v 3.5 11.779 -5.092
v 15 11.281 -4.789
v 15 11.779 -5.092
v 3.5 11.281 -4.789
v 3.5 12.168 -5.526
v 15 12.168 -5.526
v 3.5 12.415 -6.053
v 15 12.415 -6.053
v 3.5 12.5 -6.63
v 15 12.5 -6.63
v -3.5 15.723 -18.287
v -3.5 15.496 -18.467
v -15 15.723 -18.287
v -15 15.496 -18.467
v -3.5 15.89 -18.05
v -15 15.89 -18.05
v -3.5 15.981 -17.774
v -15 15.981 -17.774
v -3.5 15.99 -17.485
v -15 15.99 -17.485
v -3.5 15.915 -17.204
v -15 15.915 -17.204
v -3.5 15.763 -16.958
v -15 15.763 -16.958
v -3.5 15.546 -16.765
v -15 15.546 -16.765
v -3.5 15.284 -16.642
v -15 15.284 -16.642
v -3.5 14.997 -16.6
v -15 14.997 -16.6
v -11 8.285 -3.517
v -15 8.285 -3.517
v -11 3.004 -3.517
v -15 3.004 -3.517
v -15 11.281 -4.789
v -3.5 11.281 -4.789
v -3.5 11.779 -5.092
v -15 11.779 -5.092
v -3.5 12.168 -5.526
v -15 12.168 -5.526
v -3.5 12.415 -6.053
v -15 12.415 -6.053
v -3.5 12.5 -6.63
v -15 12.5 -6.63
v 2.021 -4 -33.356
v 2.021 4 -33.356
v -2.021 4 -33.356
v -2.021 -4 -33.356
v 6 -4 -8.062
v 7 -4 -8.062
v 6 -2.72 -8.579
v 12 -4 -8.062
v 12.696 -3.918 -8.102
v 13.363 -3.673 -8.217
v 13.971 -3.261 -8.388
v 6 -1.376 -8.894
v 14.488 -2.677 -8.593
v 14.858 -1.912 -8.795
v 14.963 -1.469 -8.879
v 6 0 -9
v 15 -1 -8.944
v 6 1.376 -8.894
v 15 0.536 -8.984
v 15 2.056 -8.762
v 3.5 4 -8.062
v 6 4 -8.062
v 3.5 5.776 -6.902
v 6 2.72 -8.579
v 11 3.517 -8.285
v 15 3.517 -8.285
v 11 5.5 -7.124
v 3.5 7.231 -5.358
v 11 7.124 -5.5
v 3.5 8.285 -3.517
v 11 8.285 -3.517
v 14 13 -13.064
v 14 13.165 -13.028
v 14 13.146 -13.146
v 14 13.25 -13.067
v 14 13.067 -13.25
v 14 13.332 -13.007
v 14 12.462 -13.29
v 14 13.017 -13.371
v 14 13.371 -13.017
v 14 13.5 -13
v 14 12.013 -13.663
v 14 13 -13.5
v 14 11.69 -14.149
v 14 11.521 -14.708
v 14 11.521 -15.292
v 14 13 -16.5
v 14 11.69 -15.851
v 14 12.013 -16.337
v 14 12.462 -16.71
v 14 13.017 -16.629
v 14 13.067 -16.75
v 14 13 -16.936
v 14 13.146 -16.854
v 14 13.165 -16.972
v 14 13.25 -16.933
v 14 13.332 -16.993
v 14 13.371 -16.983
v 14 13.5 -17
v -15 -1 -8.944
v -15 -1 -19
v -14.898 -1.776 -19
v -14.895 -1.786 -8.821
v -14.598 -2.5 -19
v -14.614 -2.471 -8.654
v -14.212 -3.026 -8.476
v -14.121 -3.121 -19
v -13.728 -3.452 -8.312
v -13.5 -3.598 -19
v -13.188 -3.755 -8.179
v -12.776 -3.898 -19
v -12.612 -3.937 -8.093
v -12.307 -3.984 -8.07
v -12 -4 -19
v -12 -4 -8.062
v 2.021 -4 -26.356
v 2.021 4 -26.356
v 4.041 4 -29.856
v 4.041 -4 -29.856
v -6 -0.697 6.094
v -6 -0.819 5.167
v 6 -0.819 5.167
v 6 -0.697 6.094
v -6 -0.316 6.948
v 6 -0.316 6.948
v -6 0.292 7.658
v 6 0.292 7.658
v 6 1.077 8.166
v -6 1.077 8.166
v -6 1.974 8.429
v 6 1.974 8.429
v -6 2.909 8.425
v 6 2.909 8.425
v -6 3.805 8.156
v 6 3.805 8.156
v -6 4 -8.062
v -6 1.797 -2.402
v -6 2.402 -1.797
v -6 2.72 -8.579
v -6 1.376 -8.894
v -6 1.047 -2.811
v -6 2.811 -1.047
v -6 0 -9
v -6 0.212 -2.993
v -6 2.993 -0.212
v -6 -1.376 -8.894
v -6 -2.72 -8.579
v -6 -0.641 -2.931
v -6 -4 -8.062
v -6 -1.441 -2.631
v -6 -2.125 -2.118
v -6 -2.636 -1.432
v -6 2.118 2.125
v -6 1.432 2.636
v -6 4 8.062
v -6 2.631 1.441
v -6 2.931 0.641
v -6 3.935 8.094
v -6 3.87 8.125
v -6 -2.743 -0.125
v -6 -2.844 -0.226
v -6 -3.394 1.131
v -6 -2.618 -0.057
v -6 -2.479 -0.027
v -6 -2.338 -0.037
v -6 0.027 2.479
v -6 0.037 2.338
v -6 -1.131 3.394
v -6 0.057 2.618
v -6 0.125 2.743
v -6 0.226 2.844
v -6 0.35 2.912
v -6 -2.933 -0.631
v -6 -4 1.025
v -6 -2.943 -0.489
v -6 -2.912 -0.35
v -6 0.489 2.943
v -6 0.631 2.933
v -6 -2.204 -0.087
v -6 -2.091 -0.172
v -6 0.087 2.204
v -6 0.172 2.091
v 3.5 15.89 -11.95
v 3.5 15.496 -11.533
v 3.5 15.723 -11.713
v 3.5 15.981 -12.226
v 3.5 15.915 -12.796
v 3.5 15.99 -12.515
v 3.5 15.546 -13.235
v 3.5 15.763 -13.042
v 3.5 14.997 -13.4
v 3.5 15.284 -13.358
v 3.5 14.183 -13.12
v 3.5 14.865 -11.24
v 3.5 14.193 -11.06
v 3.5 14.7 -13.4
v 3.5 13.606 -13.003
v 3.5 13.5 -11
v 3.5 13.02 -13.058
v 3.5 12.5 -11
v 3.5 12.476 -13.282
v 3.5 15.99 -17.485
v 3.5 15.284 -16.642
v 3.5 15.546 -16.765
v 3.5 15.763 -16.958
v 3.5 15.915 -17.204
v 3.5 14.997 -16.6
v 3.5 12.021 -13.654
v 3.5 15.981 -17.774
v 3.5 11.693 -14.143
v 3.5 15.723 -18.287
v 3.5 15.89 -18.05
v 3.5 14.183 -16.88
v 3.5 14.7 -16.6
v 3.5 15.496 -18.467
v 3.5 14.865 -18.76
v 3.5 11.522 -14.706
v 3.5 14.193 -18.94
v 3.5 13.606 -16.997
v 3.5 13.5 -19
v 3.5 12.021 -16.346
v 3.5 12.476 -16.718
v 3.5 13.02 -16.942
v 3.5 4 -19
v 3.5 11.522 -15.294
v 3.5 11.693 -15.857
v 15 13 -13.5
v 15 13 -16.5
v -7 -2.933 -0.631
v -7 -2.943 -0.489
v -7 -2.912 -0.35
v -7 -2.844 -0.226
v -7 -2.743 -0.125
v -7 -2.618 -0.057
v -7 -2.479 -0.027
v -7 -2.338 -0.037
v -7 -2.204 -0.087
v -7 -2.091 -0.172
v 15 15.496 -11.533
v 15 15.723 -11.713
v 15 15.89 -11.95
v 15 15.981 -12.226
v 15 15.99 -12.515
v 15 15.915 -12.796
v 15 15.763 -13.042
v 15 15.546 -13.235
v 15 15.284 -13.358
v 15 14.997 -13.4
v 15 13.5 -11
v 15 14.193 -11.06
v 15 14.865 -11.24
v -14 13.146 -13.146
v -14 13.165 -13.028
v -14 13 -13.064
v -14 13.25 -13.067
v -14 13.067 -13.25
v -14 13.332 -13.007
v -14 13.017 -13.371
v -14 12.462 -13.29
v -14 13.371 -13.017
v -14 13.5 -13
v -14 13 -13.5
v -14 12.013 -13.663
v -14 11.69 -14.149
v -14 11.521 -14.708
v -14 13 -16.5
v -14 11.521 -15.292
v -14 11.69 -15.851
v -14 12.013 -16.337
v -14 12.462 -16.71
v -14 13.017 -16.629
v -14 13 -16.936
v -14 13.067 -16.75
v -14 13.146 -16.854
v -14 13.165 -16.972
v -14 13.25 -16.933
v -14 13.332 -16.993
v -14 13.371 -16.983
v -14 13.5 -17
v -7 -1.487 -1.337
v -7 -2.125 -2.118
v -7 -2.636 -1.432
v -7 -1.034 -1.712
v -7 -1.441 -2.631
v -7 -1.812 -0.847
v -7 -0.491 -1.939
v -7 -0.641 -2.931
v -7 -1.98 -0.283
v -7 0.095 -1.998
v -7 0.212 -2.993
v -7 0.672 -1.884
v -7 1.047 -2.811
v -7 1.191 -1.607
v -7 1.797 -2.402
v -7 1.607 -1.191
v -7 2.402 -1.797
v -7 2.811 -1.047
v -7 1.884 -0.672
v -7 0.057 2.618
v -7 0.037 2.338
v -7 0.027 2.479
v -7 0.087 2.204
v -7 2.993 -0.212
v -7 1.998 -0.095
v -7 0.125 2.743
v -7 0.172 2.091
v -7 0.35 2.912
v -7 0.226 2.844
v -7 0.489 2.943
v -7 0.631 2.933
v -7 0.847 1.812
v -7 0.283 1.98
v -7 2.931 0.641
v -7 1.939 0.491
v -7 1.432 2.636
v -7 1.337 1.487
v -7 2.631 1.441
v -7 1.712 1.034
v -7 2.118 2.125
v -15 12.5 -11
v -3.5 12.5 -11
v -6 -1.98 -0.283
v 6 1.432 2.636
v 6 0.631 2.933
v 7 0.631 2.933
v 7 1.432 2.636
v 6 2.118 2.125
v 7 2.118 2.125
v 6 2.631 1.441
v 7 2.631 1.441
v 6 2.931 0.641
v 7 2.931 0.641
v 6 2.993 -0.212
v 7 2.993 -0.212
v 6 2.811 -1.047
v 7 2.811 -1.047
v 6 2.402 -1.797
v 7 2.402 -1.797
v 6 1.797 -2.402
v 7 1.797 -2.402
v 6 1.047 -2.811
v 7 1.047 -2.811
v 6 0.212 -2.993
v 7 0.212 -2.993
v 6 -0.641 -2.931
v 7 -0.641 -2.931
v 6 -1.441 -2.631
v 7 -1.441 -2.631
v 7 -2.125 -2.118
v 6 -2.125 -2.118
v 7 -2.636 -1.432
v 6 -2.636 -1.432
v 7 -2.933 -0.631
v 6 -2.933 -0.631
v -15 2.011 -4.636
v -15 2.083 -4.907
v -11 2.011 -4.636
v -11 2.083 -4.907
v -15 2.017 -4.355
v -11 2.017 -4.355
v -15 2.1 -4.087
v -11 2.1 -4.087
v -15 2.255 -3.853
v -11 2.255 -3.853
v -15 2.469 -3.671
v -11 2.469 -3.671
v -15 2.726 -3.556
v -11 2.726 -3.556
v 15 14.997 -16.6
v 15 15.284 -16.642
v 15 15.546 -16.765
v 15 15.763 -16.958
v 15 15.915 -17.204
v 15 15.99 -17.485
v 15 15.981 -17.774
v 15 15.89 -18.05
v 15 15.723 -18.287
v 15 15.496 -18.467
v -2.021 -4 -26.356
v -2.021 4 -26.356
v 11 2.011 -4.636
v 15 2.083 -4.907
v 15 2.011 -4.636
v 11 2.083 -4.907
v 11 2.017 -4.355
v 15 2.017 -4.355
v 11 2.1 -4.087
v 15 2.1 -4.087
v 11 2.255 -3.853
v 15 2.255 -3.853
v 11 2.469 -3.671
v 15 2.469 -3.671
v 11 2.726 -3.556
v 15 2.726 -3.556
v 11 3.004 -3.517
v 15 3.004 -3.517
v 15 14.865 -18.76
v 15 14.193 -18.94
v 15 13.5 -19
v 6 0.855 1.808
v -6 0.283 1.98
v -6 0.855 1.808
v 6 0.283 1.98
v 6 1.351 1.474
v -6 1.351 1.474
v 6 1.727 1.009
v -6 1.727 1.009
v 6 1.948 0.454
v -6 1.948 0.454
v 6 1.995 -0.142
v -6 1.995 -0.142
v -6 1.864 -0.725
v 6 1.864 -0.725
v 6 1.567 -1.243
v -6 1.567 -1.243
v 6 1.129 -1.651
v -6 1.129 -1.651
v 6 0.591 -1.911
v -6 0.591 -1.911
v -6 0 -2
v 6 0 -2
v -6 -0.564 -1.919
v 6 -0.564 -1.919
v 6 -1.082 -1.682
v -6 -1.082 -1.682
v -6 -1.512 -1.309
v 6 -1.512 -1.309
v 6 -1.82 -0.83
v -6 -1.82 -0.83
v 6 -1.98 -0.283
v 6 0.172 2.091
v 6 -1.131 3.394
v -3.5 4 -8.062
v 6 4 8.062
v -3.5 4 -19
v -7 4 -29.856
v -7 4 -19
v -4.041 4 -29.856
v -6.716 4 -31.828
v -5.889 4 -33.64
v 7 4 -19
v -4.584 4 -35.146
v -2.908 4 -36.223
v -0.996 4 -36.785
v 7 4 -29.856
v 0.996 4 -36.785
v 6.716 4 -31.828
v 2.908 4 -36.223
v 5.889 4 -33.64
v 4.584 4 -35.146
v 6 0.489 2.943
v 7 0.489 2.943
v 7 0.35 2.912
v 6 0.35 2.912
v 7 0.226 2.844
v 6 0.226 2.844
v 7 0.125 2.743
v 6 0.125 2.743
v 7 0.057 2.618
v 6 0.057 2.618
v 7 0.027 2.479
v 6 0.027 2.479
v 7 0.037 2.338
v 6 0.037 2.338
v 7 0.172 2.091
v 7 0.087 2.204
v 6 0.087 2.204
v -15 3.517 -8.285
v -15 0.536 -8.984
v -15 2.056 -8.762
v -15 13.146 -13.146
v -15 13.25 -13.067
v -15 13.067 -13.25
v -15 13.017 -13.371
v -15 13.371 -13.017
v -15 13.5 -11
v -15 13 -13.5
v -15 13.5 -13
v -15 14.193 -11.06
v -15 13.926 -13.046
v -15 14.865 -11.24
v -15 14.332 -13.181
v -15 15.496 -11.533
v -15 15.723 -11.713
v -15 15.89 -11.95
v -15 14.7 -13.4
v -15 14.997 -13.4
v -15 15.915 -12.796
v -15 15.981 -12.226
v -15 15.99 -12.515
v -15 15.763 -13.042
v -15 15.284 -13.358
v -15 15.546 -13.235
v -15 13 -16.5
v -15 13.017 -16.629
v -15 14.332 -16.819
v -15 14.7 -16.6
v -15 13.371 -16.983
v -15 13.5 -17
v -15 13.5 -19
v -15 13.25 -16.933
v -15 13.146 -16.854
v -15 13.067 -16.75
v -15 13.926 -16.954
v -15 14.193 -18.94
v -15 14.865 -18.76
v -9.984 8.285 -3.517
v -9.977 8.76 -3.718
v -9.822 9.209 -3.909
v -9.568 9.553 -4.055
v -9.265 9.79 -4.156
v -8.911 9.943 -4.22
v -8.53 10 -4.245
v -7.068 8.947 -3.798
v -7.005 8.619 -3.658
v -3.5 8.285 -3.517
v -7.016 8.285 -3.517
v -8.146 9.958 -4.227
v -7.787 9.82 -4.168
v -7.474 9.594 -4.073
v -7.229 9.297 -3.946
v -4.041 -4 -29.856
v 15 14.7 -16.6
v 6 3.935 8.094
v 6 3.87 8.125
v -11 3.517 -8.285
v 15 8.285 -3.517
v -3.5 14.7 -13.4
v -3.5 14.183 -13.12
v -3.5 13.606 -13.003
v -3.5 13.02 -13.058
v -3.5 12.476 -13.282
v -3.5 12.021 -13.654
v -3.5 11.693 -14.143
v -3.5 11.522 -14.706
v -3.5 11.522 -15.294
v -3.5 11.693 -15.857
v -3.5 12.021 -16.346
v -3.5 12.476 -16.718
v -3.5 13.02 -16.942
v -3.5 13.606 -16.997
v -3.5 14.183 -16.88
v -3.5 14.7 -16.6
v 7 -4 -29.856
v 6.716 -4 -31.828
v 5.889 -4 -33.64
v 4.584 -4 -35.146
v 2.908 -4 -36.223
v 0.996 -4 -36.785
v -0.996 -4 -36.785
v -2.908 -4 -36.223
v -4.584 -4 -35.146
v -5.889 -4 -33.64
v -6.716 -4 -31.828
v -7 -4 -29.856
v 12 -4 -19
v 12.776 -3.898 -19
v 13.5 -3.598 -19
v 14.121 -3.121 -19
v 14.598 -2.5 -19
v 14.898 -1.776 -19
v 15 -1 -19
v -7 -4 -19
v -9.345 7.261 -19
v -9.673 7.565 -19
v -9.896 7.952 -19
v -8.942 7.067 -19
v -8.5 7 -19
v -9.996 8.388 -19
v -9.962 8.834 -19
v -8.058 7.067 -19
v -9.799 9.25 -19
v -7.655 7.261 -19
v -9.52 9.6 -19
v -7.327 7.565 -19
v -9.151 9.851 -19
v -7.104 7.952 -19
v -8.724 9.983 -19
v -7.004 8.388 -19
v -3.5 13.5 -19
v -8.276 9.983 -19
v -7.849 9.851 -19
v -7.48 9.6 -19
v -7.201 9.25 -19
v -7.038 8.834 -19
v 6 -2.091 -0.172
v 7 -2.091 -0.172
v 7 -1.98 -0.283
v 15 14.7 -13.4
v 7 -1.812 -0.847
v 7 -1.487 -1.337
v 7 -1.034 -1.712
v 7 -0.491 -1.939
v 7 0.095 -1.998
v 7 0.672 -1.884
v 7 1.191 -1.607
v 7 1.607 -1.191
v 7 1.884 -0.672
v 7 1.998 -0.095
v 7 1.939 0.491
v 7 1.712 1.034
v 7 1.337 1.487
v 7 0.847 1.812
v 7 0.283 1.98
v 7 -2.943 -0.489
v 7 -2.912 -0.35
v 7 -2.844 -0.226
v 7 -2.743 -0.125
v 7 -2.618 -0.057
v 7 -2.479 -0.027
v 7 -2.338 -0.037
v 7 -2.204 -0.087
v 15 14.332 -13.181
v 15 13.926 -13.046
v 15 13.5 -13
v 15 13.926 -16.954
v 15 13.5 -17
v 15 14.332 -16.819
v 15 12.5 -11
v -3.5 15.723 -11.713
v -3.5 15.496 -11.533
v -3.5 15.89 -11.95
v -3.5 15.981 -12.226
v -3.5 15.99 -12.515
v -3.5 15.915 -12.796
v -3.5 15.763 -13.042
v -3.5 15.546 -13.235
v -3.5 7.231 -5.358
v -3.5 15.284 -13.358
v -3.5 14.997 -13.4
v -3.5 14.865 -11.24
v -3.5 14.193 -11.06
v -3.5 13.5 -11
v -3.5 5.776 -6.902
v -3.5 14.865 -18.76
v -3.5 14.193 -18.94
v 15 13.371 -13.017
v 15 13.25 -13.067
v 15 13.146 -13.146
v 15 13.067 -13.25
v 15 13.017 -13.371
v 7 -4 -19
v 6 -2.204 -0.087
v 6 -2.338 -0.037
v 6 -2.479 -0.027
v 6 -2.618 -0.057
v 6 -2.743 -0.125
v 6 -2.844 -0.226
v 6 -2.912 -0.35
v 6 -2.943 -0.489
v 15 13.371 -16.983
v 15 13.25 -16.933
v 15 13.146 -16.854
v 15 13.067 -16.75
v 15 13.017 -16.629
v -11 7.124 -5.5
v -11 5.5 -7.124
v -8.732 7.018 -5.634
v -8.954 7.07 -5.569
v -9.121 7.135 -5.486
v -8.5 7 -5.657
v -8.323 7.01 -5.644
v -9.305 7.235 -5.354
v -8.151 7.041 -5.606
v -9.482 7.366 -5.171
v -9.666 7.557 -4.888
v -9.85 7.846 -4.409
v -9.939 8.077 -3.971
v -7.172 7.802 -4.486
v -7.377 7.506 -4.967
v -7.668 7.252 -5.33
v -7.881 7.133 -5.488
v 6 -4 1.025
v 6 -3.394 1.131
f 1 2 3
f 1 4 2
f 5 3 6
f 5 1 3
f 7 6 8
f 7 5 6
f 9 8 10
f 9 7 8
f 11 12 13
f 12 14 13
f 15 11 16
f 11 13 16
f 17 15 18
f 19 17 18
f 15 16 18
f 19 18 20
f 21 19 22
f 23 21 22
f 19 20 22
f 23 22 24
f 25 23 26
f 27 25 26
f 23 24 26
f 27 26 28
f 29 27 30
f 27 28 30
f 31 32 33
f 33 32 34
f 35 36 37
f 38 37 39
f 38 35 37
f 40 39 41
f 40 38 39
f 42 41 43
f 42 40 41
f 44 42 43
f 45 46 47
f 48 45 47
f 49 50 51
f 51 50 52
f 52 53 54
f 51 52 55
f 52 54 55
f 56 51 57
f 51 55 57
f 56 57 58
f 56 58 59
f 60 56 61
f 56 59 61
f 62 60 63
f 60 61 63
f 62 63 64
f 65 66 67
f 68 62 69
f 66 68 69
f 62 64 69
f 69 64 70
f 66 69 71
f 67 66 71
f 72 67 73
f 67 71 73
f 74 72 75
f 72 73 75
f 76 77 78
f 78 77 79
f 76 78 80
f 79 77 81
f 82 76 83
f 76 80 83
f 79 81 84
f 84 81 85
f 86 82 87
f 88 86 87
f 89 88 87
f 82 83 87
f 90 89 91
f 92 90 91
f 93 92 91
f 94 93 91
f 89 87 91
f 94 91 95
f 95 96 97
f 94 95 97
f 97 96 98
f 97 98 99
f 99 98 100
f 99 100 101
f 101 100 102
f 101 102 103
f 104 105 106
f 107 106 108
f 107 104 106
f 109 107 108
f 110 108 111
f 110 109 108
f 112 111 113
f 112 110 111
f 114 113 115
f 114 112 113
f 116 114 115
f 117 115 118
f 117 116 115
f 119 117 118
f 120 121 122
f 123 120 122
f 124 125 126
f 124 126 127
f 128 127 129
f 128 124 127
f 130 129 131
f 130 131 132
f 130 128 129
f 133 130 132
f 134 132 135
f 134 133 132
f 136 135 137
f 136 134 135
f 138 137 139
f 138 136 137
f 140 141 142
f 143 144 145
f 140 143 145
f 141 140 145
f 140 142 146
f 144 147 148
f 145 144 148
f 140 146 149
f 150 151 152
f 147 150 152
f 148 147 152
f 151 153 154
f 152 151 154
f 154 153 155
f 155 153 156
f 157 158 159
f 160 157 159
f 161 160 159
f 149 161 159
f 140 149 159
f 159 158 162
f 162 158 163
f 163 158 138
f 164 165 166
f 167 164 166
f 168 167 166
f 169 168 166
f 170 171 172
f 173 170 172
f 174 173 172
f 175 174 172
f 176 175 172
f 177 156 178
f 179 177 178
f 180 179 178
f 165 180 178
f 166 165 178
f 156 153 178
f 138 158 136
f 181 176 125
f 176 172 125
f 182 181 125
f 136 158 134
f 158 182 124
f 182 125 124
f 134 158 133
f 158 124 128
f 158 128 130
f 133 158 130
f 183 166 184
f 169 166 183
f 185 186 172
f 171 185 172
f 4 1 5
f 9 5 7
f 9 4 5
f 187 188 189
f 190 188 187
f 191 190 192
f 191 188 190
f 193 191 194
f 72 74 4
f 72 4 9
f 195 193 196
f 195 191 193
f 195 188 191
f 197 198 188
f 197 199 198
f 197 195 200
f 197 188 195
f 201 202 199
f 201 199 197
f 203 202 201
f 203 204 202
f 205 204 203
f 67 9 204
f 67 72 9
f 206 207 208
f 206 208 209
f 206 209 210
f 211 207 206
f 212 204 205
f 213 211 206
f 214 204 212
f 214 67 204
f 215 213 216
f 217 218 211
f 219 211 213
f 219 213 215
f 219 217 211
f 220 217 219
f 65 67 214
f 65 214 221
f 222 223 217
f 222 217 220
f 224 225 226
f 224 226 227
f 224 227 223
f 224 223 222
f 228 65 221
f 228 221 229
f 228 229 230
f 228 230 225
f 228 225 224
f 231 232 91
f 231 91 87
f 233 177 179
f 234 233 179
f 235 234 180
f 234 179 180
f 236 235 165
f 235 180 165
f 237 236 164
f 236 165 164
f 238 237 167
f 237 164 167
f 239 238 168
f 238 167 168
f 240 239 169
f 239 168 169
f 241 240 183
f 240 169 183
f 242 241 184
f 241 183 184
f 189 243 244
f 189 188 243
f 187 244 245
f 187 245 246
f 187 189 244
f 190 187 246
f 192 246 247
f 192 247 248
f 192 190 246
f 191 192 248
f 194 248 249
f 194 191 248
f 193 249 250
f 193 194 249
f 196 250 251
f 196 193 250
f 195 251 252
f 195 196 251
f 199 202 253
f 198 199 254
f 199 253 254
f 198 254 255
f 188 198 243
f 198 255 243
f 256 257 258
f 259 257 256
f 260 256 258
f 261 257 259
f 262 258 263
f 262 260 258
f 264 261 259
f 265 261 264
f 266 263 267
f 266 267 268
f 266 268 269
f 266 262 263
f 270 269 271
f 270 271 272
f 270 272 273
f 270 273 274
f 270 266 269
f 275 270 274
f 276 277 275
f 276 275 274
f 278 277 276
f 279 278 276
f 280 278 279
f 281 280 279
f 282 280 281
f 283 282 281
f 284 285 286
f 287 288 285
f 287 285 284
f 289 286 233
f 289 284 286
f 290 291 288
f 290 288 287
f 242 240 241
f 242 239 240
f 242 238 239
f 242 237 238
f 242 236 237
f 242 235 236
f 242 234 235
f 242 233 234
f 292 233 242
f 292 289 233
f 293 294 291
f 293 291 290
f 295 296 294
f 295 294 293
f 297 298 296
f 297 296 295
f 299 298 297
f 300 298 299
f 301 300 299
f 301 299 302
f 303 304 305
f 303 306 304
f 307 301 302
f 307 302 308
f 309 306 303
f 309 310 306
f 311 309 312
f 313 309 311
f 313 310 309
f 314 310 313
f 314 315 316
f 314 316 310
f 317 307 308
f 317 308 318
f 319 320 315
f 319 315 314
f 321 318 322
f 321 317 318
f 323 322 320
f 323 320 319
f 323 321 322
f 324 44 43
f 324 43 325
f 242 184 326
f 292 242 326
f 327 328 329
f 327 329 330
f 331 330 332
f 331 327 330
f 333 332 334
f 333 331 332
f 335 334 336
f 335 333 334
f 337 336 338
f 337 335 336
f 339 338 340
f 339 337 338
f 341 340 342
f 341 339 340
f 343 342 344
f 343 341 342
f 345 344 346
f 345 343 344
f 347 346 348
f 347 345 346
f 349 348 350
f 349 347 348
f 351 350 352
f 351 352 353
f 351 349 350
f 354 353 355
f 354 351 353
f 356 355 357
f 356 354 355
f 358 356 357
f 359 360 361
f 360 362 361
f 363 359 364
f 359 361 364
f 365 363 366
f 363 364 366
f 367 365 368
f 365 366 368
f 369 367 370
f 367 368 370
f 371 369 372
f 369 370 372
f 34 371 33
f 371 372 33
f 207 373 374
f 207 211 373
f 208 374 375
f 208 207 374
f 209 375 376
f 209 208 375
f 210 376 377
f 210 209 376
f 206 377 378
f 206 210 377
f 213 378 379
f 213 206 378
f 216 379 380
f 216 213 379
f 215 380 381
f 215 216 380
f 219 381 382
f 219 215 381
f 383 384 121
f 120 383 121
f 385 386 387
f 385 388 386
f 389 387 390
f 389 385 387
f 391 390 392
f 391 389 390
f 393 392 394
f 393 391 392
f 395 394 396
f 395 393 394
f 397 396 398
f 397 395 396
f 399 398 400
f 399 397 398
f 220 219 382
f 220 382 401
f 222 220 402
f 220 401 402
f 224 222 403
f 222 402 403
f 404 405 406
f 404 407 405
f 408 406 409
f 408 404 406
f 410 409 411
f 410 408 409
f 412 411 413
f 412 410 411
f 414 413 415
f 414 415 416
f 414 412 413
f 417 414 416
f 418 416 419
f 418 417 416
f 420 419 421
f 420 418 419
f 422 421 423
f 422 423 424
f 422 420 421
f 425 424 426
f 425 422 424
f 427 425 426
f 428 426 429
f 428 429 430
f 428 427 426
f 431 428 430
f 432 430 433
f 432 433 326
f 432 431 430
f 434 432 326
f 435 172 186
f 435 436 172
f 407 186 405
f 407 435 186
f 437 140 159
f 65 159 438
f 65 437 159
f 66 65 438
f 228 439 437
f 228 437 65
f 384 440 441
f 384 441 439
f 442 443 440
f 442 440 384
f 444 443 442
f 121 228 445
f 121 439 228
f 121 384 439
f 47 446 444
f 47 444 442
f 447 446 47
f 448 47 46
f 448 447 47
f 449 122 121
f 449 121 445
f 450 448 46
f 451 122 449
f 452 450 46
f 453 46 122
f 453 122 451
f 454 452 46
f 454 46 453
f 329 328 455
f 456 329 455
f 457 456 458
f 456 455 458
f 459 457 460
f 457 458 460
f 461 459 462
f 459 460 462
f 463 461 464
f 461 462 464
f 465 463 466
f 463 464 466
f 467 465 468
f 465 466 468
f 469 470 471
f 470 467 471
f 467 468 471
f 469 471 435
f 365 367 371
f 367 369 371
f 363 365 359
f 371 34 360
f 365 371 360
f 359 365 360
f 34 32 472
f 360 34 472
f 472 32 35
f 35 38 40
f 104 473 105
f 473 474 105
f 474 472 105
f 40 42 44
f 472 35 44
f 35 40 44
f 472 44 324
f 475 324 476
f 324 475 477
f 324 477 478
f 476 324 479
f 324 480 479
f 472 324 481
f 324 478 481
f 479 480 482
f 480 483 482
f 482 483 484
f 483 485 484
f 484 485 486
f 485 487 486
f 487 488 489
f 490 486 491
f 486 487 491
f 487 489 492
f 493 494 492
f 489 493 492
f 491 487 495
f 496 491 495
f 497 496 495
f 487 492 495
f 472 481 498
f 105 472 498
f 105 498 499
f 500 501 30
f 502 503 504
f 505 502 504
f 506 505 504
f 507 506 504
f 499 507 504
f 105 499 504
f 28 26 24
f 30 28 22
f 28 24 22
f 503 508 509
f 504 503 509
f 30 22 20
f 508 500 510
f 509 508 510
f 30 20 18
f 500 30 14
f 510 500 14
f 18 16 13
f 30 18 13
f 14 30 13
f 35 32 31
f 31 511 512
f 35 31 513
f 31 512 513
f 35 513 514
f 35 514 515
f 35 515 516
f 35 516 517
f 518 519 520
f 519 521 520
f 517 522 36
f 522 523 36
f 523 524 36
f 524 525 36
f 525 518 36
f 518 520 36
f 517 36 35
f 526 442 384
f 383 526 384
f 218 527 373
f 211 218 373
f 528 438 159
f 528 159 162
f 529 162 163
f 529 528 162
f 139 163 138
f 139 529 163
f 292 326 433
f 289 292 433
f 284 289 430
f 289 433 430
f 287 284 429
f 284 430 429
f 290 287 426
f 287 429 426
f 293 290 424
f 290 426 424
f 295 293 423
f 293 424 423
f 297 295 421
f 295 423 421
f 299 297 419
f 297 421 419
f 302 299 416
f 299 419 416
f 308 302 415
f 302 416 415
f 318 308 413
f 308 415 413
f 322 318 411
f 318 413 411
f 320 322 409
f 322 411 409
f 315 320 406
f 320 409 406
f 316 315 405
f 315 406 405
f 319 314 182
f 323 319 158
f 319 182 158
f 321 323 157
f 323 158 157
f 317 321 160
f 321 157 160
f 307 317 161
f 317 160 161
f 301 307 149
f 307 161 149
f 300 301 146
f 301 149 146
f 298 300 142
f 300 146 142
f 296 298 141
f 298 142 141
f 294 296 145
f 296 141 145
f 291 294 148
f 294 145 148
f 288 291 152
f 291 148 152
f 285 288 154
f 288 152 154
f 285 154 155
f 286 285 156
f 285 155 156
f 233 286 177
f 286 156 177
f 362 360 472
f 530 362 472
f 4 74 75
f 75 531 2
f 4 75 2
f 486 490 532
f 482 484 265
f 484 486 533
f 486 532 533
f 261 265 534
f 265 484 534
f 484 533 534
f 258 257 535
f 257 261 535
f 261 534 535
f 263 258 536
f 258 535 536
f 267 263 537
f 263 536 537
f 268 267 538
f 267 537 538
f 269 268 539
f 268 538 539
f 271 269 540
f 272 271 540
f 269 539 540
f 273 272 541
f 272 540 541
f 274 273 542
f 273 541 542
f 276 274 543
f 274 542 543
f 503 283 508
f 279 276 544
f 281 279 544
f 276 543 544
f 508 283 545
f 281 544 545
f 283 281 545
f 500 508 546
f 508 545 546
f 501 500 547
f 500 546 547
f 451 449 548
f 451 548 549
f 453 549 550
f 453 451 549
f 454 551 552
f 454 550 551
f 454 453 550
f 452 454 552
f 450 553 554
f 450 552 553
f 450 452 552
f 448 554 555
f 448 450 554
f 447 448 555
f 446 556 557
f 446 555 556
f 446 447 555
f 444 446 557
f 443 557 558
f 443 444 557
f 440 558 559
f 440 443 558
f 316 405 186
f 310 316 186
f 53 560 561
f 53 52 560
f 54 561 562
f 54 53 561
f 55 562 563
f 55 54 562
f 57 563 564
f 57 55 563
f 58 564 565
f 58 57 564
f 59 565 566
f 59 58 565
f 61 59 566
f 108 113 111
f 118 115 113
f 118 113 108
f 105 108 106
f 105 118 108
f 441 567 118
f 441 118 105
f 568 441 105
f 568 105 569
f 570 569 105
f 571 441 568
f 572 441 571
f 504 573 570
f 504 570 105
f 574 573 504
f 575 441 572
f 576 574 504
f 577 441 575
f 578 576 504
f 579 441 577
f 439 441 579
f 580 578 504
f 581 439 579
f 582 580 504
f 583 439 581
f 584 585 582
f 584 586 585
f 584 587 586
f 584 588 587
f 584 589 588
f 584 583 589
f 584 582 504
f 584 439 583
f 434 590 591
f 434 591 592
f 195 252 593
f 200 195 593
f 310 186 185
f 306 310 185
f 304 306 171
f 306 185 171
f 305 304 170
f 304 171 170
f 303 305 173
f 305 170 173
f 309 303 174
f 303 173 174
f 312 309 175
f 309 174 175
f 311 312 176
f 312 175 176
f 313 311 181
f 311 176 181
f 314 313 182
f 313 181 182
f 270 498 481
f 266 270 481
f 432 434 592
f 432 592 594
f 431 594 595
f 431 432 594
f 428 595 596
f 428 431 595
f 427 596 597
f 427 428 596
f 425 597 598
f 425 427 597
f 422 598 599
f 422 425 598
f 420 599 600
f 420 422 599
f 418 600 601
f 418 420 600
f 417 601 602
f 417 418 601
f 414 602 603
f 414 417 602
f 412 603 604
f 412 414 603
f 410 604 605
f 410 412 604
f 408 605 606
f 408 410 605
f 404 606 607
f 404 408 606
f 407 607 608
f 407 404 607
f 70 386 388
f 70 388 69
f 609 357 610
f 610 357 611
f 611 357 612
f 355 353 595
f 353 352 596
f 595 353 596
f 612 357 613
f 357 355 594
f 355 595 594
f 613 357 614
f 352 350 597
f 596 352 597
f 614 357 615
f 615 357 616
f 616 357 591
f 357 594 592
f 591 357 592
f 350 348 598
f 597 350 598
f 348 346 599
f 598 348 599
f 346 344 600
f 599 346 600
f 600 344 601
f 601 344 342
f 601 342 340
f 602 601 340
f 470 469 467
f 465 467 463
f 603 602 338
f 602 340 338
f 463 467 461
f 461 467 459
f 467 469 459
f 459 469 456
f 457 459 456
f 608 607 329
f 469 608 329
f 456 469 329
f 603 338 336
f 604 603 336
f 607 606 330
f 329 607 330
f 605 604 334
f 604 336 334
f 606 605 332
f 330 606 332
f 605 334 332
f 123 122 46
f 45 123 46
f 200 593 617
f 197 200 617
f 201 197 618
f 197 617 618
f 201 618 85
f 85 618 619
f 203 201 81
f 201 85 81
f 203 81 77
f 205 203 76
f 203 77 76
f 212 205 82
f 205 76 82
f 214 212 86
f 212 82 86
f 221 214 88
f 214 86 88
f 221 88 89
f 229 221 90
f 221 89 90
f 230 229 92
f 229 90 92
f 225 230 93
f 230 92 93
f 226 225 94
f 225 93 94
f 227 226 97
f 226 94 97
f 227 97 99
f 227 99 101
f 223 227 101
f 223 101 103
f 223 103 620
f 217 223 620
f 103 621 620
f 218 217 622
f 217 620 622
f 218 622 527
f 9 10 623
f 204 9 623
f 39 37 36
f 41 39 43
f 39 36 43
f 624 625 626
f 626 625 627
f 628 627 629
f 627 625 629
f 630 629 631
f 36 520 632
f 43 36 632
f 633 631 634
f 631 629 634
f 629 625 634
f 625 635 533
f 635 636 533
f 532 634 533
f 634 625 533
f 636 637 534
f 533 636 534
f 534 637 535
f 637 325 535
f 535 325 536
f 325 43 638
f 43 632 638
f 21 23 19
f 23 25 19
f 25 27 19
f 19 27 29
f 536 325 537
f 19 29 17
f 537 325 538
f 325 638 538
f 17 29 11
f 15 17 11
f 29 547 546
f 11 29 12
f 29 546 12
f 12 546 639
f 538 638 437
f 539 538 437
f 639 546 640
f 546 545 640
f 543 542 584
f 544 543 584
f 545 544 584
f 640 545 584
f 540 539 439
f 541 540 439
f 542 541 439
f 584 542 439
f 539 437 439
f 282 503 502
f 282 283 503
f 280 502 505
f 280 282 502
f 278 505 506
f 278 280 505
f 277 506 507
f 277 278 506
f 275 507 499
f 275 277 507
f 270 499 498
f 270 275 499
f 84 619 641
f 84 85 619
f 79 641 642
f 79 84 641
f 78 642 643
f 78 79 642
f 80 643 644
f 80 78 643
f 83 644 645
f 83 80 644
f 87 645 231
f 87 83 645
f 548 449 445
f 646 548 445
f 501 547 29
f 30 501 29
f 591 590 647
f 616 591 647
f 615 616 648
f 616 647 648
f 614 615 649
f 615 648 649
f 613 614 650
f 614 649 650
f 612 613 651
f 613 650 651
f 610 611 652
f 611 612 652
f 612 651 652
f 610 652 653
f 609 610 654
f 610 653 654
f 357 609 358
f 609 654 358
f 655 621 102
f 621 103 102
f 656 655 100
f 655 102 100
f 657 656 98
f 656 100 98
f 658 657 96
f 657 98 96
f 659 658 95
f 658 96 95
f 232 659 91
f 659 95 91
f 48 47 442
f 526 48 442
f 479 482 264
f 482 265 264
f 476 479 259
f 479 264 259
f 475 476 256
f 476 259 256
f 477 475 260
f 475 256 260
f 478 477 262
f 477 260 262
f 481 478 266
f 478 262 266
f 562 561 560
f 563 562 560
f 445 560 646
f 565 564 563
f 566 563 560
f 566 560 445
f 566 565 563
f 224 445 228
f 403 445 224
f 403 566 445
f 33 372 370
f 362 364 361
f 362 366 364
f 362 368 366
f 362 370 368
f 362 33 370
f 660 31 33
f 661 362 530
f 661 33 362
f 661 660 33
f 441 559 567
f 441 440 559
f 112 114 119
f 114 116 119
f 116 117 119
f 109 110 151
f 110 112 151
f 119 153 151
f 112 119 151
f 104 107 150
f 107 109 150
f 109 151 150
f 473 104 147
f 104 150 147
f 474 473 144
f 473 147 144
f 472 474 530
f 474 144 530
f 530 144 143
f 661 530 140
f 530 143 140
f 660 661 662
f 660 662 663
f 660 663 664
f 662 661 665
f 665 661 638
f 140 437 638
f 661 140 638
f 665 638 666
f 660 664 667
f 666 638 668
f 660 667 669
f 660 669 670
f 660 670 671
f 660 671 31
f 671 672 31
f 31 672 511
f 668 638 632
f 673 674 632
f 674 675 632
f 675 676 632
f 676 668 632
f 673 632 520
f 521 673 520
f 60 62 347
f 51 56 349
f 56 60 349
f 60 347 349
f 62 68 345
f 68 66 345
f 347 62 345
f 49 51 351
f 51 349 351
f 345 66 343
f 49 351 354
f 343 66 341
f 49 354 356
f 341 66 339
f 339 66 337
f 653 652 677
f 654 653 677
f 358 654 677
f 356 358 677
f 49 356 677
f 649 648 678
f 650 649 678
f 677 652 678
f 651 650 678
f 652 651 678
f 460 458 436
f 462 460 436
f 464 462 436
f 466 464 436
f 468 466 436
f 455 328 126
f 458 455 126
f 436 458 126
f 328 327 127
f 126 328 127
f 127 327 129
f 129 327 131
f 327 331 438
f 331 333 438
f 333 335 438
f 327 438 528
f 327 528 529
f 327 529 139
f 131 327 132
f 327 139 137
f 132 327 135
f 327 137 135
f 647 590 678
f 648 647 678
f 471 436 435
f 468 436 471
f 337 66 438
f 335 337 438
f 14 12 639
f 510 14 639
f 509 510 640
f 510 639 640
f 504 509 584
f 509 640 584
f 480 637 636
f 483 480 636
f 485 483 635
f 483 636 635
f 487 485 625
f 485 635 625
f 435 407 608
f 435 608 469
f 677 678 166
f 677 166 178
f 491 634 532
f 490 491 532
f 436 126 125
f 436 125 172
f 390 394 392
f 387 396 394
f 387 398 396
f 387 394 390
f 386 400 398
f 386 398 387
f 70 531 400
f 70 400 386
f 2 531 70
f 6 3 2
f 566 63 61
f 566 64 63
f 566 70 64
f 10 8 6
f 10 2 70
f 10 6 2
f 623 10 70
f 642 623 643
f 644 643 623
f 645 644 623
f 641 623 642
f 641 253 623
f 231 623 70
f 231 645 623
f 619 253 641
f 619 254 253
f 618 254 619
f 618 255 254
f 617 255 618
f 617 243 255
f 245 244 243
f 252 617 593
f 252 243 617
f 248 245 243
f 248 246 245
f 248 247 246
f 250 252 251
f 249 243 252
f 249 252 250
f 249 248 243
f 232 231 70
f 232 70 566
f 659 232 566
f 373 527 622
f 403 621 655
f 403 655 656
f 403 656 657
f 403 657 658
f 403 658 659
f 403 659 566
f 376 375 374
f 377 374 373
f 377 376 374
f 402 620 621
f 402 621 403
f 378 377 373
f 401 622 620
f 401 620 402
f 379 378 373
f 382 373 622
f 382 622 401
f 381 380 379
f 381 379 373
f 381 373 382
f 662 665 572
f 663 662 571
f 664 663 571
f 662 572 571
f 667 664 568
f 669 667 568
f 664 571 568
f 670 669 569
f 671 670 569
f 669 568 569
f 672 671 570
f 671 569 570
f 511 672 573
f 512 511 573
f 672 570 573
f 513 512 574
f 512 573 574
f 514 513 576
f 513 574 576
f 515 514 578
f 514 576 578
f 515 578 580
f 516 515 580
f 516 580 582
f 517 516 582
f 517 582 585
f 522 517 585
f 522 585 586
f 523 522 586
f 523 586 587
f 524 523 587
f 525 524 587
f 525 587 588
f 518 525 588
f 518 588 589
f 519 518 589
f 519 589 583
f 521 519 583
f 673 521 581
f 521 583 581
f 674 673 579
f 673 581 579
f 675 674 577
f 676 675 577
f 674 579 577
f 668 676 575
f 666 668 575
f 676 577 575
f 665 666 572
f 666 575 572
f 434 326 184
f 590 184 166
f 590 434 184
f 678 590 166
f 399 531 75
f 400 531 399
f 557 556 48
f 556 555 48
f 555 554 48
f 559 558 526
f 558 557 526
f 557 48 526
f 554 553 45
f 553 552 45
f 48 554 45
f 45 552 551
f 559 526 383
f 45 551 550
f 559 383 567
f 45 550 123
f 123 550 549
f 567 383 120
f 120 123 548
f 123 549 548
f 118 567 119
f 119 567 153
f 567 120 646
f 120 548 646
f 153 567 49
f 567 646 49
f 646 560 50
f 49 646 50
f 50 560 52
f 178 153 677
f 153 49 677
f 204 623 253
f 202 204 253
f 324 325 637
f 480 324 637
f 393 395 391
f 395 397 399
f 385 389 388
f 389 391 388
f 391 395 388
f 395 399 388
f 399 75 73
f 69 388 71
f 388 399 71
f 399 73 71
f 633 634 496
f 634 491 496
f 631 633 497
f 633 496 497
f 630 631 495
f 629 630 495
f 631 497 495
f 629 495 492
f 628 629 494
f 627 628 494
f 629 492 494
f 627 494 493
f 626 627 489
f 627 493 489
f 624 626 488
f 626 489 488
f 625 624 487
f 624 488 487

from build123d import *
from build123d.topology import SkipClean

# Parameters (mm, degrees)
BOSS_EXTRUDE1_DEPTH      = 6
BOSS_EXTRUDE2_DEPTH      = 7
SKETCH6_R                = 7
BOSS_EXTRUDE3_DEPTH      = 18
BOSS_EXTRUDE4_DEPTH      = 8
BOSS_EXTRUDE4_DEPTH_BACK = 8
SKETCH7_R                = 4.5
CUT_EXTRUDE2_DEPTH       = 5
CUT_EXTRUDE4_START       = -5
CUT_EXTRUDE4_DEPTH       = 5
BOSS_EXTRUDE6_DEPTH      = 1
FILLET3_R                = 0.5
FILLET3_OF_MIRROR1_R     = 0.5
BOSS_EXTRUDE5_DEPTH      = 15
SKETCH20_W               = 7
SKETCH20_H               = 38
CUT_EXTRUDE7_DEPTH       = 42.913087917
FILLET1_START            = -6
FILLET1_DEPTH            = 12
FILLET2_R                = 1
CUT_EXTRUDE8_DEPTH       = 42.560578801
BOSS_EXTRUDE7_DEPTH      = 1
FILLET4_R                = 0.5
FILLET4_OF_MIRROR2_R     = 0.5
FILLET5_R                = 3
FILLET7_R                = 2
CUT_SWEEP1_PROFILE_R     = 1.5
BOSS_EXTRUDE8_DEPTH      = 4
FILLET8_R                = 1
FILLET8_OF_MIRROR3_R     = 1


with BuildPart() as part:
    # Sketch3 → Boss-Extrude1 (new, symmetric)
    with BuildSketch(Plane(origin=(0, 0, 0), x_dir=(0, 0, -1), z_dir=(1, 0, 0))):
        with BuildLine():
            ThreePointArc((2, 0), (1.51090791, -1.310403483), (0.282842712, -1.979898987))
            Line((0.282842712, -1.979898987), (-1.13137085, -3.39411255))
            Line((-1.13137085, -3.39411255), (-0.81880413, -5.166766505))
            Line((-0.81880413, -5.166766505), (-3.807139593, -8.155101968))
            ThreePointArc((-3.807139593, -8.155101968), (4.834032667, -7.591582718), (9, 0))
            ThreePointArc((9, 0), (-1.949882341, 8.7862369), (-8.155101968, -3.807139593))
            Line((-8.155101968, -3.807139593), (-5.166766505, -0.81880413))
            Line((-5.166766505, -0.81880413), (-3.39411255, -1.13137085))
            Line((-3.39411255, -1.13137085), (-1.979898987, 0.282842712))
            ThreePointArc((-1.979898987, 0.282842712), (0.14177804, 1.994968418), (2, 0))
        make_face()
    extrude(amount=BOSS_EXTRUDE1_DEPTH, both=True)

    # Sketch5 → Boss-Extrude2 (add, symmetric)
    with BuildSketch(Plane(origin=(0, 0, 0), x_dir=(0, 0, -1), z_dir=(1, 0, 0))):
        with BuildLine():
            Line((0, 9), (29.855960009, 9))
            Line((29.855960009, 9), (29.855960009, -9))
            Line((29.855960009, -9), (0, -9))
            ThreePointArc((0, -9), (9, 0), (0, 9))
        make_face()
    extrude(amount=BOSS_EXTRUDE2_DEPTH, both=True)

    # Sketch6 → Boss-Extrude3 (add)
    with BuildSketch(Plane(origin=(0, 9, 0), x_dir=(1, 0, 0), z_dir=(0, 1, 0))):
        with Locations((0, 29.855960009)):
            Circle(SKETCH6_R)
    extrude(amount=-BOSS_EXTRUDE3_DEPTH)

    # Sketch7 → Boss-Extrude4 (add, two sides: drawn at the far end of the back side and taken through both)
    with BuildSketch(Plane(origin=(0, 0, 0), x_dir=(1, 0, 0), z_dir=(0, 1, 0)).offset(-BOSS_EXTRUDE4_DEPTH_BACK)):
        with Locations((0, 29.855960009)):
            Circle(SKETCH7_R)
    extrude(amount=BOSS_EXTRUDE4_DEPTH + BOSS_EXTRUDE4_DEPTH_BACK)

    # Sketch8 → Cut-Extrude2 (cut)
    with BuildSketch(Plane(origin=(0, 9, 0), x_dir=(1, 0, 0), z_dir=(0, 1, 0))):
        with BuildLine():
            Line((6, -9), (6, 0))
            Line((6, 0), (7, 0))
            Line((7, 0), (7, 29.855960009))
            ThreePointArc((7, 29.855960009), (0, 36.855960009), (-7, 29.855960009))
            Line((-7, 29.855960009), (-7, 0))
            Line((-7, 0), (-6, 0))
            Line((-6, 0), (-6, -9))
            Line((-6, -9), (6, -9))
        make_face()
    extrude(amount=-CUT_EXTRUDE2_DEPTH, mode=Mode.SUBTRACT)

    # Sketch9 → Cut-Extrude4 (cut)
    with BuildSketch(Plane.XZ.offset(9).offset(CUT_EXTRUDE4_START)):
        with BuildLine():
            Line((6, 0), (6, 9))
            Line((6, 9), (-6, 9))
            Line((-6, 9), (-6, 0))
            Line((-6, 0), (-7, 0))
            Line((-7, 0), (-7, -29.855960009))
            ThreePointArc((-7, -29.855960009), (0, -36.855960009), (7, -29.855960009))
            Line((7, -29.855960009), (7, 0))
            Line((7, 0), (6, 0))
        make_face()
    extrude(amount=CUT_EXTRUDE4_DEPTH, mode=Mode.SUBTRACT)

    # Sketch24 → Boss-Extrude6 (add)
    with SkipClean():  # the faces are left unmerged after this step: merging them gives an invalid solid
        with BuildSketch(Plane.ZY.offset(6)):
            with BuildLine():
                ThreePointArc((-0.282842712, -1.979898987), (-1.414213562, 1.414213562), (1.979898987, 0.282842712))
                Line((1.979898987, 0.282842712), (2.925806694, -0.663064995))
                ThreePointArc((2.925806694, -0.663064995), (2.981393976, -0.333601496), (3, 0))
                ThreePointArc((3, 0), (-2.344055778, 1.872272018), (0.663064995, -2.925806694))
                Line((0.663064995, -2.925806694), (-0.282842712, -1.979898987))
            make_face()
        boss_extrude6 = extrude(amount=BOSS_EXTRUDE6_DEPTH)

    # Fillet3
    # the kernel refuses this fillet: 0.5 mm, written as the material it takes off along each edge
    with BuildSketch(Plane(origin=(-6, -0.663064995, 2.925806694), x_dir=(0, 0.9999849386062066, 0.005488402385122609), z_dir=(-1, 0, 0))) as fillet3_piece_1:
        with BuildLine():
            CenterArc((1.186161173, 0.488233633), FILLET3_R, 135.314463872, 147.140119621)
            Line((0.830672664, 0.839841255), (0, 0))
            ThreePointArc((0, 0), (0.646997003, -0.070598205), (1.293994007, 0))
        make_face()
    extrude(amount=4.234985017, mode=Mode.SUBTRACT)
    with BuildSketch(Plane(origin=(-6, -2.925806694, 0.663064995), x_dir=(0, -0.005488402385198552, -0.9999849386062063), z_dir=(-1, 0, 0))) as fillet3_piece_2:
        with BuildLine():
            CenterArc((1.186161173, -0.488233633), FILLET3_R, 77.545416507, 147.140119621)
            Line((0.830672664, -0.839841255), (0, 0))
            ThreePointArc((0, 0), (0.646997003, 0.070598205), (1.293994007, 0))
        make_face()
    extrude(amount=4.234985017, mode=Mode.SUBTRACT)

    # Mirror1: Boss-Extrude6 across plane
    add(boss_extrude6.mirror(Plane(origin=(0, 0, 0), x_dir=(0, 0, 1), z_dir=(1, 0, 0))))

    # Fillet3 of Mirror1
    # the kernel refuses this fillet: 0.5 mm, written as the material it takes off along each edge
    with BuildSketch(Plane(origin=(6, -0.663064995, 2.925806694), x_dir=(0, 0.7071067811865444, -0.7071067811865507), z_dir=(1, 0, 0))) as fillet3_of_mirror1_piece_1:
        with BuildLine():
            CenterArc((1.181249511, 0.5), FILLET3_OF_MIRROR1_R, 122.859880379, 147.140119621)
            ThreePointArc((0.909956312, 0.92), (0.404784455, 0.509645734), (0, 0))
            Line((0, 0), (1.181249511, 0))
        make_face()
    extrude(amount=4.234985017, mode=Mode.SUBTRACT)
    with BuildSketch(Plane(origin=(6, -2.925806694, 0.663064995), x_dir=(0, 0.7071067811865442, -0.7071067811865509), z_dir=(1, 0, 0))) as fillet3_of_mirror1_piece_2:
        with BuildLine():
            CenterArc((1.181249511, -0.5), FILLET3_OF_MIRROR1_R, 90, 147.140119621)
            ThreePointArc((0.909956312, -0.92), (0.404784455, -0.509645734), (0, 0))
            Line((0, 0), (1.181249511, 0))
        make_face()
    extrude(amount=4.234985017, mode=Mode.SUBTRACT)

    # Sketch10 → Boss-Extrude5 (add, symmetric)
    with BuildSketch(Plane(origin=(0, 0, 0), x_dir=(0, 0, -1), z_dir=(1, 0, 0))):
        with BuildLine():
            ThreePointArc((8.062257748, -4), (9, 0), (8.062257748, 4))
            Line((8.062257748, 4), (19, 4))
            Line((19, 4), (19, -4))
            Line((19, -4), (8.062257748, -4))
        make_face()
        with BuildLine():
            Line((13.4, 17.166060556), (13.4, 14.7))
            ThreePointArc((13.4, 14.7), (15, 11.5), (16.6, 14.7))
            Line((16.6, 14.7), (16.6, 17.166060556))
            ThreePointArc((16.6, 17.166060556), (18.346640106, 15.69089023), (19, 13.5))
            Line((19, 13.5), (19, 4))
            Line((19, 4), (8.062257748, 4))
            ThreePointArc((8.062257748, 4), (6.173062485, 6.549297638), (3.516580156, 8.284543681))
            Line((3.516580156, 8.284543681), (5.305935203, 12.5))
            Line((5.305935203, 12.5), (11, 12.5))
            Line((11, 12.5), (11, 13.5))
            ThreePointArc((11, 13.5), (11.653359894, 15.69089023), (13.4, 17.166060556))
        make_face()
    extrude(amount=BOSS_EXTRUDE5_DEPTH, both=True)

    # Sketch20 → Cut-Extrude7 (cut, through all)
    with BuildSketch(Plane(origin=(0, 4, 0), x_dir=(1, 0, 0), z_dir=(0, 1, 0))):
        Rectangle(SKETCH20_W, SKETCH20_H)
    extrude(amount=CUT_EXTRUDE7_DEPTH, mode=Mode.SUBTRACT)

    # Fillet1: read off the stored shape, not the designer's step
    # Fillet1 outline → Fillet1 (cut)
    with BuildSketch(Plane.YZ.offset(FILLET1_START)):
        with BuildLine():
            ThreePointArc((-0.81880413, 5.166766505), (0.666331593, 7.940128227), (3.804881491, 8.156155764))
            ThreePointArc((3.804881491, 8.156155764), (-0.001245944, 8.999999913), (-3.807139593, 8.155101968))
            Line((-3.807139593, 8.155101968), (-0.81880413, 5.166766505))
        make_face()
    extrude(amount=FILLET1_DEPTH, mode=Mode.SUBTRACT)

    # Fillet2
    fillet2_edges = [part.edges().sort_by_distance(p)[0] for p in [
        (9.25, 17.166060556, -16.6),
        (9.25, 17.166060556, -13.4),
        (-9.25, 17.166060556, -13.4),
        (-9.25, 17.166060556, -16.6),
    ]]
    fillet(fillet2_edges, radius=FILLET2_R)

    # Sketch23 → Cut-Extrude8 (cut, through all)
    with BuildSketch(Plane(origin=(0, 4, 0), x_dir=(1, 0, 0), z_dir=(0, 1, 0))):
        Polygon((4.041451884, 29.855960009), (2.020725942, 33.355960009), (-2.020725942, 33.355960009), (-4.041451884, 29.855960009), (-2.020725942, 26.355960009), (2.020725942, 26.355960009), align=None)
    extrude(amount=-CUT_EXTRUDE8_DEPTH, mode=Mode.SUBTRACT)

    # Sketch25 → Boss-Extrude7 (add)
    with BuildSketch(Plane(origin=(15, 0, 0), x_dir=(0, 0, -1), z_dir=(1, 0, 0))):
        with BuildLine():
            Line((16.936491673, 13), (13.063508327, 13))
            ThreePointArc((13.063508327, 13), (15, 11.5), (16.936491673, 13))
        make_face()
    boss_extrude7 = extrude(amount=-BOSS_EXTRUDE7_DEPTH)

    # Fillet4
    fillet4_edges = [part.edges().sort_by_distance(p)[0] for p in [
        (14.5, 13, -13.063508327),
        (14.5, 13, -16.936491673),
    ]]
    fillet(fillet4_edges, radius=FILLET4_R)

    # Mirror2: Boss-Extrude7 across plane
    add(boss_extrude7.mirror(Plane(origin=(0, 0, 0), x_dir=(0, 0, 1), z_dir=(1, 0, 0))))

    # Fillet4 of Mirror2
    fillet4_of_mirror2_edges = [part.edges().sort_by_distance(p)[0] for p in [
        (-14.5, 13, -13.063508327),
        (-14.5, 13, -16.936491673),
    ]]
    fillet(fillet4_of_mirror2_edges, radius=FILLET4_OF_MIRROR2_R)

    # Fillet5
    fillet5_edges = [part.edges().sort_by_distance(p)[0] for p in [
        (15, -4, -13.531128874),
        (-15, -4, -13.531128874),
    ]]
    fillet(fillet5_edges, radius=FILLET5_R)

    # Fillet7
    fillet7_edges = [part.edges().sort_by_distance(p)[0] for p in [
        (9.25, 12.5, -5.305935203),
        (-9.25, 12.5, -5.305935203),
    ]]
    fillet(fillet7_edges, radius=FILLET7_R)

    # Cut-Sweep1: sweep along a path in Sketch27
    with BuildLine(Plane.ZY.offset(8.5)) as cut_sweep1_path:
        Line((0, 8.5), (-25.421416279, 8.5))
    # Cut-Sweep1 profile (on start of the path) → Cut-Sweep1 (sweep, cut)
    with BuildSketch(Plane(origin=(-8.5, 8.5, 0), x_dir=(0, -1, 0), z_dir=(0, 0, -1))):
        Circle(CUT_SWEEP1_PROFILE_R)
    sweep(path=cut_sweep1_path.line, mode=Mode.SUBTRACT)

    # Sketch28 → Boss-Extrude8 (add)
    with BuildSketch(Plane(origin=(15, 0, 0), x_dir=(0, 0, -1), z_dir=(1, 0, 0))):
        with BuildLine():
            Line((3.516580156, 1.492699716), (8.284543681, 3.516580156))
            ThreePointArc((8.284543681, 3.516580156), (6.363961031, 6.363961031), (3.516580156, 8.284543681))
            Line((3.516580156, 8.284543681), (3.516580156, 1.492699716))
        make_face()
    boss_extrude8 = extrude(amount=-BOSS_EXTRUDE8_DEPTH)

    # Fillet8
    fillet8_edges = [part.edges().sort_by_distance(p)[0] for p in [
        (13, 1.492699716, -3.516580156),
    ]]
    fillet(fillet8_edges, radius=FILLET8_R)

    # Mirror3: Boss-Extrude8 across plane
    add(boss_extrude8.mirror(Plane(origin=(0, 0, 0), x_dir=(0, 0, 1), z_dir=(1, 0, 0))))

    # Fillet8 of Mirror3
    fillet8_of_mirror3_edges = [part.edges().sort_by_distance(p)[0] for p in [
        (-13, 1.492699716, -3.516580156),
    ]]
    fillet(fillet8_of_mirror3_edges, radius=FILLET8_OF_MIRROR3_R)


solid = part.part
